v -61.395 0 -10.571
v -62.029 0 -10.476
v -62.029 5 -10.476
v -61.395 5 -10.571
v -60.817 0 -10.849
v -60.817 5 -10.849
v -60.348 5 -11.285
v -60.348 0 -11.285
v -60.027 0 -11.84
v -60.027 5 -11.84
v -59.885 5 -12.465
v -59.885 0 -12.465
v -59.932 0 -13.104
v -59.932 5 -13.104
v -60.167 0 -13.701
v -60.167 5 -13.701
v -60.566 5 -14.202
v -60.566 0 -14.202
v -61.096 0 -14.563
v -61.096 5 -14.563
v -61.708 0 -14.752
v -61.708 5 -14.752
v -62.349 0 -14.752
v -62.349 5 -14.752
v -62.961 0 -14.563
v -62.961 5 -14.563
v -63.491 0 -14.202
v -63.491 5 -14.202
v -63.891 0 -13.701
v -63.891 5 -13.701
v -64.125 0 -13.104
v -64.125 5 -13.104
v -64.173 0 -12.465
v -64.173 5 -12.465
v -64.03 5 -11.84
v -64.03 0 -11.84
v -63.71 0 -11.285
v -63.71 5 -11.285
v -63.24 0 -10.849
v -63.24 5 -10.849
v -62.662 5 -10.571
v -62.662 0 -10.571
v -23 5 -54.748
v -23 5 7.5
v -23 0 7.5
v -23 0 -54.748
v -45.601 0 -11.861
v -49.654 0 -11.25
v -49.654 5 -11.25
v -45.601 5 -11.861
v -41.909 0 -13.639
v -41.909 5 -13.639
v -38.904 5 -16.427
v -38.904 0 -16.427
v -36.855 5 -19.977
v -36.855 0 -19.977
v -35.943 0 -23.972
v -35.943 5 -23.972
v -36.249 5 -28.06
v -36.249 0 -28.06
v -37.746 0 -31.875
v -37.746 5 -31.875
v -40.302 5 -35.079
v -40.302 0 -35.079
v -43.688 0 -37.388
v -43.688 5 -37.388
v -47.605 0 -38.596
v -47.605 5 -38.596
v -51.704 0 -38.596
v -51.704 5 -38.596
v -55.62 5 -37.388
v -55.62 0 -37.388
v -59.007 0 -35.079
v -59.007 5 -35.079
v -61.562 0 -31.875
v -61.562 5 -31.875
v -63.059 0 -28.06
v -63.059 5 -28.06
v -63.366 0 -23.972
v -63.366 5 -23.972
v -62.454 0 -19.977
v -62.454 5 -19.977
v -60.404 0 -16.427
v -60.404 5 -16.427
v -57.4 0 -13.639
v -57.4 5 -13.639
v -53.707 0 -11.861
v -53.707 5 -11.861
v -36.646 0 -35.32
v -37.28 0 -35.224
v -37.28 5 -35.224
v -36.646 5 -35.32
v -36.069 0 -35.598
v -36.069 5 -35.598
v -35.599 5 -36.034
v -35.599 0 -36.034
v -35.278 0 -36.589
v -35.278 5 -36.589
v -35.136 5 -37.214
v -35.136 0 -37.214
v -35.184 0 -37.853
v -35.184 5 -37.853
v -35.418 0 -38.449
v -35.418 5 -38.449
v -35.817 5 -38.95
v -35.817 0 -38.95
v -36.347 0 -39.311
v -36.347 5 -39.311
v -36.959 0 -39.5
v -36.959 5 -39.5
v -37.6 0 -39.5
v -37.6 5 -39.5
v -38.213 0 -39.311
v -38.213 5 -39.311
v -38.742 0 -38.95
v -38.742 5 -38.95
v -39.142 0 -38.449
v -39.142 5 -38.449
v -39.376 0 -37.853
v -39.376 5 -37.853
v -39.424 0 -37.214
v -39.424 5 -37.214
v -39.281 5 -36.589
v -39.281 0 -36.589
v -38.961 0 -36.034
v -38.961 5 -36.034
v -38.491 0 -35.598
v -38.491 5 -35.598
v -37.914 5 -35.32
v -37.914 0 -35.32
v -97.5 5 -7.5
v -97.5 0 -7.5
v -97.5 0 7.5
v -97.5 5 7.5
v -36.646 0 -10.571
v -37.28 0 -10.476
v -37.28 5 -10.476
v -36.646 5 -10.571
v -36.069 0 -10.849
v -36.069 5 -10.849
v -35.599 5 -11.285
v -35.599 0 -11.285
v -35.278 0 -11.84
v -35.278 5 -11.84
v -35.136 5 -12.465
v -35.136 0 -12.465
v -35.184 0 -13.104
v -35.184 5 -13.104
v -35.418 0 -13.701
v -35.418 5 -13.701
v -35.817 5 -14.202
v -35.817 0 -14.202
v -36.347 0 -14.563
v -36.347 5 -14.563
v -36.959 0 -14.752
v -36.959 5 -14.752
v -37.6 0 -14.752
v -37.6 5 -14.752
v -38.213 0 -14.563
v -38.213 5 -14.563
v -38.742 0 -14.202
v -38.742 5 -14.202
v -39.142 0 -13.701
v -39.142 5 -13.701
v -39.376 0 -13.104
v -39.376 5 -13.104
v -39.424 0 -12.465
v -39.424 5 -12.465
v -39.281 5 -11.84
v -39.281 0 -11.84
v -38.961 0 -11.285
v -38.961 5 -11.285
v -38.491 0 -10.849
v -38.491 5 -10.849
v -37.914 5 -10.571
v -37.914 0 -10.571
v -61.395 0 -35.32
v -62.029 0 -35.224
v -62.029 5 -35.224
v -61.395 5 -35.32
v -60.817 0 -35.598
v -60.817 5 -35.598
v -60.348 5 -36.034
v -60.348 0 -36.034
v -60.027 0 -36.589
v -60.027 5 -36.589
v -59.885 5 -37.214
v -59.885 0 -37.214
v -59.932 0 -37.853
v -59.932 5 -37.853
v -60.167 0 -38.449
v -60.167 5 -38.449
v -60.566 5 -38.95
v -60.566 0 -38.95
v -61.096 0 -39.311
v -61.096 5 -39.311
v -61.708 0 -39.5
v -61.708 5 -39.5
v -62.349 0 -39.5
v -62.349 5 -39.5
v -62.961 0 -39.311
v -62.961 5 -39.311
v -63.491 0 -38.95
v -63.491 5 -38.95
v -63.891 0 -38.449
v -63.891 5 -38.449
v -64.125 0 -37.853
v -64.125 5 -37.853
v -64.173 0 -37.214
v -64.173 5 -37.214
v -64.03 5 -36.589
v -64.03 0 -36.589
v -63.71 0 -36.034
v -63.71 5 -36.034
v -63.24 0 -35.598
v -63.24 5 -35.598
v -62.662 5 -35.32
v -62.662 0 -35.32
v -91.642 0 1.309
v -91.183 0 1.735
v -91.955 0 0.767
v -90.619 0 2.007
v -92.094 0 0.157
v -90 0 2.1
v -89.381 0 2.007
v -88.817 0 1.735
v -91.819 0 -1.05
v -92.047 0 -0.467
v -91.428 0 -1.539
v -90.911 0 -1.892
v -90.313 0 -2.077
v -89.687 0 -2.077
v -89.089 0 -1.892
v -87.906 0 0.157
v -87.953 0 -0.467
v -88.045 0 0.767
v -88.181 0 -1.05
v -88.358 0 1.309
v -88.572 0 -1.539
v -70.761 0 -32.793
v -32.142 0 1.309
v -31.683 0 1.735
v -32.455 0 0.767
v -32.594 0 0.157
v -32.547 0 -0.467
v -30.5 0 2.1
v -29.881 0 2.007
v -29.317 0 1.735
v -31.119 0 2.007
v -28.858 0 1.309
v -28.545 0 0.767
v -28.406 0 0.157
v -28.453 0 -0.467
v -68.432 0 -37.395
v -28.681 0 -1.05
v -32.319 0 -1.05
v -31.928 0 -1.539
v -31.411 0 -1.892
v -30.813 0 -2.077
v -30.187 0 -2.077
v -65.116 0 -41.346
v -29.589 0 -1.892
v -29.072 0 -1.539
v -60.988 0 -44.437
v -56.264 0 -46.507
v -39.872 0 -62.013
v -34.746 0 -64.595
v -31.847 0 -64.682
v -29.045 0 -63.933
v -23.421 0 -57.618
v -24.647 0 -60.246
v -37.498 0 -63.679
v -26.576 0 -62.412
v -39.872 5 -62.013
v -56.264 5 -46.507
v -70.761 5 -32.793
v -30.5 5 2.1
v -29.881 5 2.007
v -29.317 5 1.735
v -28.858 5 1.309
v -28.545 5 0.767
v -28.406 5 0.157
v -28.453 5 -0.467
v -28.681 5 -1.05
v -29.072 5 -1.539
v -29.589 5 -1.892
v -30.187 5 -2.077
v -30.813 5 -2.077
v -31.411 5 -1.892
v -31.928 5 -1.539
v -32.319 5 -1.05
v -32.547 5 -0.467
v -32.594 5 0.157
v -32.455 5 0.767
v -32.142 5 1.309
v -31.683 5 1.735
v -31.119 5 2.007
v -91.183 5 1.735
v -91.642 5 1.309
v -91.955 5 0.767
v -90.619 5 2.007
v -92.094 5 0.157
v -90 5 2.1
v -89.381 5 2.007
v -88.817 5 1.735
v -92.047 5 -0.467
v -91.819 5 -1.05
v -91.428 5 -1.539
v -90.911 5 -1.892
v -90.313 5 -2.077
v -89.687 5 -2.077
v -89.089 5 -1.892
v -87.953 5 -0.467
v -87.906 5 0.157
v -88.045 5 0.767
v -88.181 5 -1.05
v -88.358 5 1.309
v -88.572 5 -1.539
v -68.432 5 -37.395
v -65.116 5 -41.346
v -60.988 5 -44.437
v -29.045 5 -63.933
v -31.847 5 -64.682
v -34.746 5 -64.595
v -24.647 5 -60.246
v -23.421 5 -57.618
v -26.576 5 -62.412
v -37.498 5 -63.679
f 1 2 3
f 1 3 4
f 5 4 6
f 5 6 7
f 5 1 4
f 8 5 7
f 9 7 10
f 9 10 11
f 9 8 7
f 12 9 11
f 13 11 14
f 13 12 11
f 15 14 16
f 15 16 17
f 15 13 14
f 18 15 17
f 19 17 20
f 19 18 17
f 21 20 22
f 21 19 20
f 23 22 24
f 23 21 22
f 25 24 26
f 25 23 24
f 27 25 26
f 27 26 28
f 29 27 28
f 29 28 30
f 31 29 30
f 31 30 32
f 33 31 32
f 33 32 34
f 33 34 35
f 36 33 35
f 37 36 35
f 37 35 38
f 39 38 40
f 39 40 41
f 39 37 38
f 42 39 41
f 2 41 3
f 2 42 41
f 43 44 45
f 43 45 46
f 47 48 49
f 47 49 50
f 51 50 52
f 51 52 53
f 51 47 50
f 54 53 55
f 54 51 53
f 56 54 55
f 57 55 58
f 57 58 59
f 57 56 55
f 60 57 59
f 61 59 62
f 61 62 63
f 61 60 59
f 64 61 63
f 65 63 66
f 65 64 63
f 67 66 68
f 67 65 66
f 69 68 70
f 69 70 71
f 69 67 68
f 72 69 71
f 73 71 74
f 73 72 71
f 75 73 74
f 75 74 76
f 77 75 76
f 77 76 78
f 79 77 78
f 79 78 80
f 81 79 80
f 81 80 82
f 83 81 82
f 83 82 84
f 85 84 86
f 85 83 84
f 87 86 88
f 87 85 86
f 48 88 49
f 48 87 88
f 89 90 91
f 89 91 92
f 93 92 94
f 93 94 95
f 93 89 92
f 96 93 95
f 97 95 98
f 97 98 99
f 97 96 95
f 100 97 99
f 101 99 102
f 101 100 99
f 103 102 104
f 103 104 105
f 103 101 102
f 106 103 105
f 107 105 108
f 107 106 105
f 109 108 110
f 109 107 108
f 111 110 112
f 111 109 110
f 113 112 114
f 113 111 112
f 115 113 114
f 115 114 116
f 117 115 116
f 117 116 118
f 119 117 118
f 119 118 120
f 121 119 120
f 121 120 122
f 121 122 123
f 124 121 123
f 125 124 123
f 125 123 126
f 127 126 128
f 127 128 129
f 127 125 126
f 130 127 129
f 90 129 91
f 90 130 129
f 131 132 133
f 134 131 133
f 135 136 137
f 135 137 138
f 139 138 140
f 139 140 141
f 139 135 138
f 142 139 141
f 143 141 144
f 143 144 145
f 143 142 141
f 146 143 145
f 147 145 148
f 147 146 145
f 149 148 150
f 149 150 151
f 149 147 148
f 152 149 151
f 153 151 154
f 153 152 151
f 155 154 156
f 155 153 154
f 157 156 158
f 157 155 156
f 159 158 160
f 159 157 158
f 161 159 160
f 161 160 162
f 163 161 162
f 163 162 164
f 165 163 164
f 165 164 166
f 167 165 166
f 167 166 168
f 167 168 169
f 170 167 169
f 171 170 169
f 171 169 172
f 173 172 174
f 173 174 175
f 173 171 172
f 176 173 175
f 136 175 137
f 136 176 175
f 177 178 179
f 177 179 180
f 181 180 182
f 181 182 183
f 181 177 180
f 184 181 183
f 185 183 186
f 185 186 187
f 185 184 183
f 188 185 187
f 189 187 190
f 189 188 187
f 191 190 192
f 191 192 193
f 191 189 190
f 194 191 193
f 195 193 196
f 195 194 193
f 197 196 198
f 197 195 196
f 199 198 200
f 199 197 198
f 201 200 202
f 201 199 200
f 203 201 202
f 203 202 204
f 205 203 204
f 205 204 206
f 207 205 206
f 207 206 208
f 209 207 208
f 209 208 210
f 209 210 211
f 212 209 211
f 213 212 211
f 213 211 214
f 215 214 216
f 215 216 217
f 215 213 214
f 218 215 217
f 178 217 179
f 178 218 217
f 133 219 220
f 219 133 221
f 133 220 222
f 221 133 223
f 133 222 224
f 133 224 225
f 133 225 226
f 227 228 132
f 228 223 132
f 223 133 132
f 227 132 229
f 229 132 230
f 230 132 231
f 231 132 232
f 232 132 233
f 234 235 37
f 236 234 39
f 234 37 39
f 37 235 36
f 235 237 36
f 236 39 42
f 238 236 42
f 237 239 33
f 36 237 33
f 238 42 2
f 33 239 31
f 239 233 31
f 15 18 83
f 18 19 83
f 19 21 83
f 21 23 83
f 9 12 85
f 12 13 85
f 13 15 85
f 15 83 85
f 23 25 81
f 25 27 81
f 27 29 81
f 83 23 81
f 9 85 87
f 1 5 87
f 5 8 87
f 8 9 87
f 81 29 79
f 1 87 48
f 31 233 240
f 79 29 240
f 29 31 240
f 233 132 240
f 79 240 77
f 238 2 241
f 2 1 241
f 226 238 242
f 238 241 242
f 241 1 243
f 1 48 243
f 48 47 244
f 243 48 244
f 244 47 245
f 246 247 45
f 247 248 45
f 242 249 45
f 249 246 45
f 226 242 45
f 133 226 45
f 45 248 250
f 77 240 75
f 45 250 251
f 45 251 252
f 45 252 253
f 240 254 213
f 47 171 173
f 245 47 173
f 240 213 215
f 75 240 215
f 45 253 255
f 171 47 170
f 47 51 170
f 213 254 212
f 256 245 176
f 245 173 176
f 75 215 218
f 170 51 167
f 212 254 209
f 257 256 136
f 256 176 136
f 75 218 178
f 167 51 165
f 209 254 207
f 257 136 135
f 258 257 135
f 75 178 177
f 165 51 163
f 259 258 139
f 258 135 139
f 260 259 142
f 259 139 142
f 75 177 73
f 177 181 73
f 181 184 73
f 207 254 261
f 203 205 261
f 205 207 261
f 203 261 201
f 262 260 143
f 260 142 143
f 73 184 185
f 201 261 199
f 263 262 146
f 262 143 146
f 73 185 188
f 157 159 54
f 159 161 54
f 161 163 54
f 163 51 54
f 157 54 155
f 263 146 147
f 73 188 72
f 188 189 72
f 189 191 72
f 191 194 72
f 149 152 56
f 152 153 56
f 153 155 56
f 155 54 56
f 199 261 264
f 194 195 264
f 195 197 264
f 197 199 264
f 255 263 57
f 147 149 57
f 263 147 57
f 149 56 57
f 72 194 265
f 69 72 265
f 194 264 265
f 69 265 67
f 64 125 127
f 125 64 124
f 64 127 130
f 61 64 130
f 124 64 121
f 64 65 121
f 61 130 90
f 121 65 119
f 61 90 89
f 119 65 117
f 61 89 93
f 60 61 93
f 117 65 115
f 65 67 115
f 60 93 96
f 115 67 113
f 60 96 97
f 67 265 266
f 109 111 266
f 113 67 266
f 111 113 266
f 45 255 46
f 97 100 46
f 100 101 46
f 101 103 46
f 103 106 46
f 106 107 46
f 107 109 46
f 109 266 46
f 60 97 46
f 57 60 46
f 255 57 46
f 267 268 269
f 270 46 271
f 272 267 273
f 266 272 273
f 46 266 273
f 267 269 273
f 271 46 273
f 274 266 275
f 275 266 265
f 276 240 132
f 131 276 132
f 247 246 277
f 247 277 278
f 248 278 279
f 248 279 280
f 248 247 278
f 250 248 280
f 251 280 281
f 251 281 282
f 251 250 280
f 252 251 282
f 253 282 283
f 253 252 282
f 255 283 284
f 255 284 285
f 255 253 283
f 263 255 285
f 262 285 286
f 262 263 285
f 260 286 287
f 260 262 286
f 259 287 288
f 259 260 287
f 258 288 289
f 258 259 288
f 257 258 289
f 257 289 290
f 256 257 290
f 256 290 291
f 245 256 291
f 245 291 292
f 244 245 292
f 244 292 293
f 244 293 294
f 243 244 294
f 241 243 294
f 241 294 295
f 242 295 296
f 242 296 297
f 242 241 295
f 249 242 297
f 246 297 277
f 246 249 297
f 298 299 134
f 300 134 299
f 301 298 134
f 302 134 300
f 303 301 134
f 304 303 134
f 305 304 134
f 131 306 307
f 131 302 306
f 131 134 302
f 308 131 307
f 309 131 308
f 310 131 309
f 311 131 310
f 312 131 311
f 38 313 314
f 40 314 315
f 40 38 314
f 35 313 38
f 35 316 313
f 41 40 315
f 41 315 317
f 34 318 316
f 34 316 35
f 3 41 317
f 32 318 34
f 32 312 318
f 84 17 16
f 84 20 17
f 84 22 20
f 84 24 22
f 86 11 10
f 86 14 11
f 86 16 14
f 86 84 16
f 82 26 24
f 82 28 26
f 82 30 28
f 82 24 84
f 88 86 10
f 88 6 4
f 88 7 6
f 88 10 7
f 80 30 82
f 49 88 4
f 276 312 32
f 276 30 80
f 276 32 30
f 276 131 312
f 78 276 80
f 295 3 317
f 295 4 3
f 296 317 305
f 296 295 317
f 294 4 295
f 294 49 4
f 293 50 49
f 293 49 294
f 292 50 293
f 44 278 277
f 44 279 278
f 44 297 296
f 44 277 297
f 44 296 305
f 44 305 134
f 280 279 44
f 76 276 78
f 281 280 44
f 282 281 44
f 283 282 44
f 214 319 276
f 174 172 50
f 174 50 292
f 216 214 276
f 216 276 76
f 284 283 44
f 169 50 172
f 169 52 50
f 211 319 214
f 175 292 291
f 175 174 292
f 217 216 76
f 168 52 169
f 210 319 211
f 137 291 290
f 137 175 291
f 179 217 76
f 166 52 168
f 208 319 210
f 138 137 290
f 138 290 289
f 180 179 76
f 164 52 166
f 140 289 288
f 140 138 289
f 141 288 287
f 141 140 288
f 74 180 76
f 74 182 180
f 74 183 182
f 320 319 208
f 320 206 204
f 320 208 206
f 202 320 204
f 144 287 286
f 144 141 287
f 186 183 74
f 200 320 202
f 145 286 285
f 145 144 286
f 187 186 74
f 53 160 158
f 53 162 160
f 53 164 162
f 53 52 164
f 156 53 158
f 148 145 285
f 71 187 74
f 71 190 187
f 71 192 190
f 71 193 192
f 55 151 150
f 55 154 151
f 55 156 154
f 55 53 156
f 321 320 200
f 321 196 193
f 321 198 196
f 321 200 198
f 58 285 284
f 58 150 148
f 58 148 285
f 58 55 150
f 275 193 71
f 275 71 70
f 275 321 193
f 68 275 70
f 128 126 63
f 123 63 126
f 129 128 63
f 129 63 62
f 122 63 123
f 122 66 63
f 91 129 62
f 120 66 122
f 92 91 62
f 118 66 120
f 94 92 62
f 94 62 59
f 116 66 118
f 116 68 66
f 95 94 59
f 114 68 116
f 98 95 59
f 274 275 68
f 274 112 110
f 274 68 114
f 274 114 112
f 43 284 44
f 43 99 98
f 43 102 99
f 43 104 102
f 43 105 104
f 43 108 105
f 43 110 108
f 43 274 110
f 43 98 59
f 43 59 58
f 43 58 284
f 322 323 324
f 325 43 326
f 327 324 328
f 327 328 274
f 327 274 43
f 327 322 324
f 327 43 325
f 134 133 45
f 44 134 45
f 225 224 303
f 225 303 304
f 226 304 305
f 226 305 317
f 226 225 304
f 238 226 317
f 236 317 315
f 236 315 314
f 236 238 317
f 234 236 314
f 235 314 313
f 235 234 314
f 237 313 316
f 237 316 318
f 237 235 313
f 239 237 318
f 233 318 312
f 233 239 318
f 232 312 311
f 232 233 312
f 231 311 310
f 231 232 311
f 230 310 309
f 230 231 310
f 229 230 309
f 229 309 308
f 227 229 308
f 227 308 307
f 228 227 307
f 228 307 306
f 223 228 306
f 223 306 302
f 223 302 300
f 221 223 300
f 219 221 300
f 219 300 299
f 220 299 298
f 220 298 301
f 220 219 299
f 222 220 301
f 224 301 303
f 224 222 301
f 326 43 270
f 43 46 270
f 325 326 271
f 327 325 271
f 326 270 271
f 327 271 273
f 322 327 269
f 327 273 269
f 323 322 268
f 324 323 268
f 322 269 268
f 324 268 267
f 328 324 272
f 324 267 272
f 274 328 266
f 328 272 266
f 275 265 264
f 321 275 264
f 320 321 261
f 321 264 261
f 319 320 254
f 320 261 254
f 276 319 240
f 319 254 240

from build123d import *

# Parameters (mm, degrees)
SKETCH_1_R          = 2.1
SKETCH_1_R_2        = 2.15
SKETCH_1_R_3        = 13.75
EXTRUDE_1_DEPTH     = 5
CUT_EXTRUDE_1_DEPTH = 5
FILLET_1_R          = 10


with BuildPart() as part:
    # ｽｹｯﾁ1 → ﾎﾞｽ - 押し出し1 (new body)
    with BuildSketch(Plane(origin=(0, 0, 0), x_dir=(1, 0, 0), z_dir=(0, 1, 0))):
        with BuildLine():
            Line((5, -7.5), (5, 0))
            Line((5, 0), (5, 90))
            Line((5, 90), (5, 95))
            Line((5, 95), (-5, 95))
            Line((-5, 95), (-56.263686619, 46.507323468))
            ThreePointArc((-56.263686619, 46.507323468), (-65.116217602, 41.345539381), (-70.761470202, 32.793203863))
            Line((-70.761470202, 32.793203863), (-97.5, 7.5))
            Line((-97.5, 7.5), (-97.5, -7.5))
            Line((-97.5, -7.5), (0, -7.5))
            Line((0, -7.5), (5, -7.5))
        make_face()
        with Locations(Location((-90, 0, 0), (0, 0, 270))):
            Circle(SKETCH_1_R, mode=Mode.SUBTRACT)
        with Locations(Location((-62.02858956, 12.625631329, 0), (0, 0, 270))):
            Circle(SKETCH_1_R_2, mode=Mode.SUBTRACT)
        with Locations(Location((-49.654220889, 25, 0), (0, 0, 270))):
            Circle(SKETCH_1_R_3, mode=Mode.SUBTRACT)
        with Locations(Location((-62.02858956, 37.374368671, 0), (0, 0, 270))):
            Circle(SKETCH_1_R_2, mode=Mode.SUBTRACT)
        with Locations(Location((-30.5, 0, 0), (0, 0, 270))):
            Circle(SKETCH_1_R, mode=Mode.SUBTRACT)
        with Locations(Location((-37.279852219, 12.625631329, 0), (0, 0, 270))):
            Circle(SKETCH_1_R_2, mode=Mode.SUBTRACT)
        with Locations(Location((0, 0, 0), (0, 0, 270))):
            Circle(SKETCH_1_R, mode=Mode.SUBTRACT)
        with Locations(Location((-37.279852219, 37.374368671, 0), (0, 0, 270))):
            Circle(SKETCH_1_R_2, mode=Mode.SUBTRACT)
        with Locations(Location((0, 90, 0), (0, 0, 270))):
            Circle(SKETCH_1_R_2, mode=Mode.SUBTRACT)
    extrude(amount=EXTRUDE_1_DEPTH)

    # ｽｹｯﾁ2 → ｶｯﾄ - 押し出し1 (cut)
    with BuildSketch(Plane(origin=(0, 5, 0), x_dir=(1, 0, 0), z_dir=(0, 1, 0))):
        Polygon((-23, -7.5), (-23, 77.972972973), (-5, 95), (5, 95), (5, -7.5), align=None)
    extrude(amount=-CUT_EXTRUDE_1_DEPTH, mode=Mode.SUBTRACT)

    # ﾌｨﾚｯﾄ1
    fillet_1_edges = [part.edges().sort_by_distance(p)[0] for p in [
        (-23, 2.5, -77.972972973),
    ]]
    fillet(fillet_1_edges, radius=FILLET_1_R)


solid = part.part
